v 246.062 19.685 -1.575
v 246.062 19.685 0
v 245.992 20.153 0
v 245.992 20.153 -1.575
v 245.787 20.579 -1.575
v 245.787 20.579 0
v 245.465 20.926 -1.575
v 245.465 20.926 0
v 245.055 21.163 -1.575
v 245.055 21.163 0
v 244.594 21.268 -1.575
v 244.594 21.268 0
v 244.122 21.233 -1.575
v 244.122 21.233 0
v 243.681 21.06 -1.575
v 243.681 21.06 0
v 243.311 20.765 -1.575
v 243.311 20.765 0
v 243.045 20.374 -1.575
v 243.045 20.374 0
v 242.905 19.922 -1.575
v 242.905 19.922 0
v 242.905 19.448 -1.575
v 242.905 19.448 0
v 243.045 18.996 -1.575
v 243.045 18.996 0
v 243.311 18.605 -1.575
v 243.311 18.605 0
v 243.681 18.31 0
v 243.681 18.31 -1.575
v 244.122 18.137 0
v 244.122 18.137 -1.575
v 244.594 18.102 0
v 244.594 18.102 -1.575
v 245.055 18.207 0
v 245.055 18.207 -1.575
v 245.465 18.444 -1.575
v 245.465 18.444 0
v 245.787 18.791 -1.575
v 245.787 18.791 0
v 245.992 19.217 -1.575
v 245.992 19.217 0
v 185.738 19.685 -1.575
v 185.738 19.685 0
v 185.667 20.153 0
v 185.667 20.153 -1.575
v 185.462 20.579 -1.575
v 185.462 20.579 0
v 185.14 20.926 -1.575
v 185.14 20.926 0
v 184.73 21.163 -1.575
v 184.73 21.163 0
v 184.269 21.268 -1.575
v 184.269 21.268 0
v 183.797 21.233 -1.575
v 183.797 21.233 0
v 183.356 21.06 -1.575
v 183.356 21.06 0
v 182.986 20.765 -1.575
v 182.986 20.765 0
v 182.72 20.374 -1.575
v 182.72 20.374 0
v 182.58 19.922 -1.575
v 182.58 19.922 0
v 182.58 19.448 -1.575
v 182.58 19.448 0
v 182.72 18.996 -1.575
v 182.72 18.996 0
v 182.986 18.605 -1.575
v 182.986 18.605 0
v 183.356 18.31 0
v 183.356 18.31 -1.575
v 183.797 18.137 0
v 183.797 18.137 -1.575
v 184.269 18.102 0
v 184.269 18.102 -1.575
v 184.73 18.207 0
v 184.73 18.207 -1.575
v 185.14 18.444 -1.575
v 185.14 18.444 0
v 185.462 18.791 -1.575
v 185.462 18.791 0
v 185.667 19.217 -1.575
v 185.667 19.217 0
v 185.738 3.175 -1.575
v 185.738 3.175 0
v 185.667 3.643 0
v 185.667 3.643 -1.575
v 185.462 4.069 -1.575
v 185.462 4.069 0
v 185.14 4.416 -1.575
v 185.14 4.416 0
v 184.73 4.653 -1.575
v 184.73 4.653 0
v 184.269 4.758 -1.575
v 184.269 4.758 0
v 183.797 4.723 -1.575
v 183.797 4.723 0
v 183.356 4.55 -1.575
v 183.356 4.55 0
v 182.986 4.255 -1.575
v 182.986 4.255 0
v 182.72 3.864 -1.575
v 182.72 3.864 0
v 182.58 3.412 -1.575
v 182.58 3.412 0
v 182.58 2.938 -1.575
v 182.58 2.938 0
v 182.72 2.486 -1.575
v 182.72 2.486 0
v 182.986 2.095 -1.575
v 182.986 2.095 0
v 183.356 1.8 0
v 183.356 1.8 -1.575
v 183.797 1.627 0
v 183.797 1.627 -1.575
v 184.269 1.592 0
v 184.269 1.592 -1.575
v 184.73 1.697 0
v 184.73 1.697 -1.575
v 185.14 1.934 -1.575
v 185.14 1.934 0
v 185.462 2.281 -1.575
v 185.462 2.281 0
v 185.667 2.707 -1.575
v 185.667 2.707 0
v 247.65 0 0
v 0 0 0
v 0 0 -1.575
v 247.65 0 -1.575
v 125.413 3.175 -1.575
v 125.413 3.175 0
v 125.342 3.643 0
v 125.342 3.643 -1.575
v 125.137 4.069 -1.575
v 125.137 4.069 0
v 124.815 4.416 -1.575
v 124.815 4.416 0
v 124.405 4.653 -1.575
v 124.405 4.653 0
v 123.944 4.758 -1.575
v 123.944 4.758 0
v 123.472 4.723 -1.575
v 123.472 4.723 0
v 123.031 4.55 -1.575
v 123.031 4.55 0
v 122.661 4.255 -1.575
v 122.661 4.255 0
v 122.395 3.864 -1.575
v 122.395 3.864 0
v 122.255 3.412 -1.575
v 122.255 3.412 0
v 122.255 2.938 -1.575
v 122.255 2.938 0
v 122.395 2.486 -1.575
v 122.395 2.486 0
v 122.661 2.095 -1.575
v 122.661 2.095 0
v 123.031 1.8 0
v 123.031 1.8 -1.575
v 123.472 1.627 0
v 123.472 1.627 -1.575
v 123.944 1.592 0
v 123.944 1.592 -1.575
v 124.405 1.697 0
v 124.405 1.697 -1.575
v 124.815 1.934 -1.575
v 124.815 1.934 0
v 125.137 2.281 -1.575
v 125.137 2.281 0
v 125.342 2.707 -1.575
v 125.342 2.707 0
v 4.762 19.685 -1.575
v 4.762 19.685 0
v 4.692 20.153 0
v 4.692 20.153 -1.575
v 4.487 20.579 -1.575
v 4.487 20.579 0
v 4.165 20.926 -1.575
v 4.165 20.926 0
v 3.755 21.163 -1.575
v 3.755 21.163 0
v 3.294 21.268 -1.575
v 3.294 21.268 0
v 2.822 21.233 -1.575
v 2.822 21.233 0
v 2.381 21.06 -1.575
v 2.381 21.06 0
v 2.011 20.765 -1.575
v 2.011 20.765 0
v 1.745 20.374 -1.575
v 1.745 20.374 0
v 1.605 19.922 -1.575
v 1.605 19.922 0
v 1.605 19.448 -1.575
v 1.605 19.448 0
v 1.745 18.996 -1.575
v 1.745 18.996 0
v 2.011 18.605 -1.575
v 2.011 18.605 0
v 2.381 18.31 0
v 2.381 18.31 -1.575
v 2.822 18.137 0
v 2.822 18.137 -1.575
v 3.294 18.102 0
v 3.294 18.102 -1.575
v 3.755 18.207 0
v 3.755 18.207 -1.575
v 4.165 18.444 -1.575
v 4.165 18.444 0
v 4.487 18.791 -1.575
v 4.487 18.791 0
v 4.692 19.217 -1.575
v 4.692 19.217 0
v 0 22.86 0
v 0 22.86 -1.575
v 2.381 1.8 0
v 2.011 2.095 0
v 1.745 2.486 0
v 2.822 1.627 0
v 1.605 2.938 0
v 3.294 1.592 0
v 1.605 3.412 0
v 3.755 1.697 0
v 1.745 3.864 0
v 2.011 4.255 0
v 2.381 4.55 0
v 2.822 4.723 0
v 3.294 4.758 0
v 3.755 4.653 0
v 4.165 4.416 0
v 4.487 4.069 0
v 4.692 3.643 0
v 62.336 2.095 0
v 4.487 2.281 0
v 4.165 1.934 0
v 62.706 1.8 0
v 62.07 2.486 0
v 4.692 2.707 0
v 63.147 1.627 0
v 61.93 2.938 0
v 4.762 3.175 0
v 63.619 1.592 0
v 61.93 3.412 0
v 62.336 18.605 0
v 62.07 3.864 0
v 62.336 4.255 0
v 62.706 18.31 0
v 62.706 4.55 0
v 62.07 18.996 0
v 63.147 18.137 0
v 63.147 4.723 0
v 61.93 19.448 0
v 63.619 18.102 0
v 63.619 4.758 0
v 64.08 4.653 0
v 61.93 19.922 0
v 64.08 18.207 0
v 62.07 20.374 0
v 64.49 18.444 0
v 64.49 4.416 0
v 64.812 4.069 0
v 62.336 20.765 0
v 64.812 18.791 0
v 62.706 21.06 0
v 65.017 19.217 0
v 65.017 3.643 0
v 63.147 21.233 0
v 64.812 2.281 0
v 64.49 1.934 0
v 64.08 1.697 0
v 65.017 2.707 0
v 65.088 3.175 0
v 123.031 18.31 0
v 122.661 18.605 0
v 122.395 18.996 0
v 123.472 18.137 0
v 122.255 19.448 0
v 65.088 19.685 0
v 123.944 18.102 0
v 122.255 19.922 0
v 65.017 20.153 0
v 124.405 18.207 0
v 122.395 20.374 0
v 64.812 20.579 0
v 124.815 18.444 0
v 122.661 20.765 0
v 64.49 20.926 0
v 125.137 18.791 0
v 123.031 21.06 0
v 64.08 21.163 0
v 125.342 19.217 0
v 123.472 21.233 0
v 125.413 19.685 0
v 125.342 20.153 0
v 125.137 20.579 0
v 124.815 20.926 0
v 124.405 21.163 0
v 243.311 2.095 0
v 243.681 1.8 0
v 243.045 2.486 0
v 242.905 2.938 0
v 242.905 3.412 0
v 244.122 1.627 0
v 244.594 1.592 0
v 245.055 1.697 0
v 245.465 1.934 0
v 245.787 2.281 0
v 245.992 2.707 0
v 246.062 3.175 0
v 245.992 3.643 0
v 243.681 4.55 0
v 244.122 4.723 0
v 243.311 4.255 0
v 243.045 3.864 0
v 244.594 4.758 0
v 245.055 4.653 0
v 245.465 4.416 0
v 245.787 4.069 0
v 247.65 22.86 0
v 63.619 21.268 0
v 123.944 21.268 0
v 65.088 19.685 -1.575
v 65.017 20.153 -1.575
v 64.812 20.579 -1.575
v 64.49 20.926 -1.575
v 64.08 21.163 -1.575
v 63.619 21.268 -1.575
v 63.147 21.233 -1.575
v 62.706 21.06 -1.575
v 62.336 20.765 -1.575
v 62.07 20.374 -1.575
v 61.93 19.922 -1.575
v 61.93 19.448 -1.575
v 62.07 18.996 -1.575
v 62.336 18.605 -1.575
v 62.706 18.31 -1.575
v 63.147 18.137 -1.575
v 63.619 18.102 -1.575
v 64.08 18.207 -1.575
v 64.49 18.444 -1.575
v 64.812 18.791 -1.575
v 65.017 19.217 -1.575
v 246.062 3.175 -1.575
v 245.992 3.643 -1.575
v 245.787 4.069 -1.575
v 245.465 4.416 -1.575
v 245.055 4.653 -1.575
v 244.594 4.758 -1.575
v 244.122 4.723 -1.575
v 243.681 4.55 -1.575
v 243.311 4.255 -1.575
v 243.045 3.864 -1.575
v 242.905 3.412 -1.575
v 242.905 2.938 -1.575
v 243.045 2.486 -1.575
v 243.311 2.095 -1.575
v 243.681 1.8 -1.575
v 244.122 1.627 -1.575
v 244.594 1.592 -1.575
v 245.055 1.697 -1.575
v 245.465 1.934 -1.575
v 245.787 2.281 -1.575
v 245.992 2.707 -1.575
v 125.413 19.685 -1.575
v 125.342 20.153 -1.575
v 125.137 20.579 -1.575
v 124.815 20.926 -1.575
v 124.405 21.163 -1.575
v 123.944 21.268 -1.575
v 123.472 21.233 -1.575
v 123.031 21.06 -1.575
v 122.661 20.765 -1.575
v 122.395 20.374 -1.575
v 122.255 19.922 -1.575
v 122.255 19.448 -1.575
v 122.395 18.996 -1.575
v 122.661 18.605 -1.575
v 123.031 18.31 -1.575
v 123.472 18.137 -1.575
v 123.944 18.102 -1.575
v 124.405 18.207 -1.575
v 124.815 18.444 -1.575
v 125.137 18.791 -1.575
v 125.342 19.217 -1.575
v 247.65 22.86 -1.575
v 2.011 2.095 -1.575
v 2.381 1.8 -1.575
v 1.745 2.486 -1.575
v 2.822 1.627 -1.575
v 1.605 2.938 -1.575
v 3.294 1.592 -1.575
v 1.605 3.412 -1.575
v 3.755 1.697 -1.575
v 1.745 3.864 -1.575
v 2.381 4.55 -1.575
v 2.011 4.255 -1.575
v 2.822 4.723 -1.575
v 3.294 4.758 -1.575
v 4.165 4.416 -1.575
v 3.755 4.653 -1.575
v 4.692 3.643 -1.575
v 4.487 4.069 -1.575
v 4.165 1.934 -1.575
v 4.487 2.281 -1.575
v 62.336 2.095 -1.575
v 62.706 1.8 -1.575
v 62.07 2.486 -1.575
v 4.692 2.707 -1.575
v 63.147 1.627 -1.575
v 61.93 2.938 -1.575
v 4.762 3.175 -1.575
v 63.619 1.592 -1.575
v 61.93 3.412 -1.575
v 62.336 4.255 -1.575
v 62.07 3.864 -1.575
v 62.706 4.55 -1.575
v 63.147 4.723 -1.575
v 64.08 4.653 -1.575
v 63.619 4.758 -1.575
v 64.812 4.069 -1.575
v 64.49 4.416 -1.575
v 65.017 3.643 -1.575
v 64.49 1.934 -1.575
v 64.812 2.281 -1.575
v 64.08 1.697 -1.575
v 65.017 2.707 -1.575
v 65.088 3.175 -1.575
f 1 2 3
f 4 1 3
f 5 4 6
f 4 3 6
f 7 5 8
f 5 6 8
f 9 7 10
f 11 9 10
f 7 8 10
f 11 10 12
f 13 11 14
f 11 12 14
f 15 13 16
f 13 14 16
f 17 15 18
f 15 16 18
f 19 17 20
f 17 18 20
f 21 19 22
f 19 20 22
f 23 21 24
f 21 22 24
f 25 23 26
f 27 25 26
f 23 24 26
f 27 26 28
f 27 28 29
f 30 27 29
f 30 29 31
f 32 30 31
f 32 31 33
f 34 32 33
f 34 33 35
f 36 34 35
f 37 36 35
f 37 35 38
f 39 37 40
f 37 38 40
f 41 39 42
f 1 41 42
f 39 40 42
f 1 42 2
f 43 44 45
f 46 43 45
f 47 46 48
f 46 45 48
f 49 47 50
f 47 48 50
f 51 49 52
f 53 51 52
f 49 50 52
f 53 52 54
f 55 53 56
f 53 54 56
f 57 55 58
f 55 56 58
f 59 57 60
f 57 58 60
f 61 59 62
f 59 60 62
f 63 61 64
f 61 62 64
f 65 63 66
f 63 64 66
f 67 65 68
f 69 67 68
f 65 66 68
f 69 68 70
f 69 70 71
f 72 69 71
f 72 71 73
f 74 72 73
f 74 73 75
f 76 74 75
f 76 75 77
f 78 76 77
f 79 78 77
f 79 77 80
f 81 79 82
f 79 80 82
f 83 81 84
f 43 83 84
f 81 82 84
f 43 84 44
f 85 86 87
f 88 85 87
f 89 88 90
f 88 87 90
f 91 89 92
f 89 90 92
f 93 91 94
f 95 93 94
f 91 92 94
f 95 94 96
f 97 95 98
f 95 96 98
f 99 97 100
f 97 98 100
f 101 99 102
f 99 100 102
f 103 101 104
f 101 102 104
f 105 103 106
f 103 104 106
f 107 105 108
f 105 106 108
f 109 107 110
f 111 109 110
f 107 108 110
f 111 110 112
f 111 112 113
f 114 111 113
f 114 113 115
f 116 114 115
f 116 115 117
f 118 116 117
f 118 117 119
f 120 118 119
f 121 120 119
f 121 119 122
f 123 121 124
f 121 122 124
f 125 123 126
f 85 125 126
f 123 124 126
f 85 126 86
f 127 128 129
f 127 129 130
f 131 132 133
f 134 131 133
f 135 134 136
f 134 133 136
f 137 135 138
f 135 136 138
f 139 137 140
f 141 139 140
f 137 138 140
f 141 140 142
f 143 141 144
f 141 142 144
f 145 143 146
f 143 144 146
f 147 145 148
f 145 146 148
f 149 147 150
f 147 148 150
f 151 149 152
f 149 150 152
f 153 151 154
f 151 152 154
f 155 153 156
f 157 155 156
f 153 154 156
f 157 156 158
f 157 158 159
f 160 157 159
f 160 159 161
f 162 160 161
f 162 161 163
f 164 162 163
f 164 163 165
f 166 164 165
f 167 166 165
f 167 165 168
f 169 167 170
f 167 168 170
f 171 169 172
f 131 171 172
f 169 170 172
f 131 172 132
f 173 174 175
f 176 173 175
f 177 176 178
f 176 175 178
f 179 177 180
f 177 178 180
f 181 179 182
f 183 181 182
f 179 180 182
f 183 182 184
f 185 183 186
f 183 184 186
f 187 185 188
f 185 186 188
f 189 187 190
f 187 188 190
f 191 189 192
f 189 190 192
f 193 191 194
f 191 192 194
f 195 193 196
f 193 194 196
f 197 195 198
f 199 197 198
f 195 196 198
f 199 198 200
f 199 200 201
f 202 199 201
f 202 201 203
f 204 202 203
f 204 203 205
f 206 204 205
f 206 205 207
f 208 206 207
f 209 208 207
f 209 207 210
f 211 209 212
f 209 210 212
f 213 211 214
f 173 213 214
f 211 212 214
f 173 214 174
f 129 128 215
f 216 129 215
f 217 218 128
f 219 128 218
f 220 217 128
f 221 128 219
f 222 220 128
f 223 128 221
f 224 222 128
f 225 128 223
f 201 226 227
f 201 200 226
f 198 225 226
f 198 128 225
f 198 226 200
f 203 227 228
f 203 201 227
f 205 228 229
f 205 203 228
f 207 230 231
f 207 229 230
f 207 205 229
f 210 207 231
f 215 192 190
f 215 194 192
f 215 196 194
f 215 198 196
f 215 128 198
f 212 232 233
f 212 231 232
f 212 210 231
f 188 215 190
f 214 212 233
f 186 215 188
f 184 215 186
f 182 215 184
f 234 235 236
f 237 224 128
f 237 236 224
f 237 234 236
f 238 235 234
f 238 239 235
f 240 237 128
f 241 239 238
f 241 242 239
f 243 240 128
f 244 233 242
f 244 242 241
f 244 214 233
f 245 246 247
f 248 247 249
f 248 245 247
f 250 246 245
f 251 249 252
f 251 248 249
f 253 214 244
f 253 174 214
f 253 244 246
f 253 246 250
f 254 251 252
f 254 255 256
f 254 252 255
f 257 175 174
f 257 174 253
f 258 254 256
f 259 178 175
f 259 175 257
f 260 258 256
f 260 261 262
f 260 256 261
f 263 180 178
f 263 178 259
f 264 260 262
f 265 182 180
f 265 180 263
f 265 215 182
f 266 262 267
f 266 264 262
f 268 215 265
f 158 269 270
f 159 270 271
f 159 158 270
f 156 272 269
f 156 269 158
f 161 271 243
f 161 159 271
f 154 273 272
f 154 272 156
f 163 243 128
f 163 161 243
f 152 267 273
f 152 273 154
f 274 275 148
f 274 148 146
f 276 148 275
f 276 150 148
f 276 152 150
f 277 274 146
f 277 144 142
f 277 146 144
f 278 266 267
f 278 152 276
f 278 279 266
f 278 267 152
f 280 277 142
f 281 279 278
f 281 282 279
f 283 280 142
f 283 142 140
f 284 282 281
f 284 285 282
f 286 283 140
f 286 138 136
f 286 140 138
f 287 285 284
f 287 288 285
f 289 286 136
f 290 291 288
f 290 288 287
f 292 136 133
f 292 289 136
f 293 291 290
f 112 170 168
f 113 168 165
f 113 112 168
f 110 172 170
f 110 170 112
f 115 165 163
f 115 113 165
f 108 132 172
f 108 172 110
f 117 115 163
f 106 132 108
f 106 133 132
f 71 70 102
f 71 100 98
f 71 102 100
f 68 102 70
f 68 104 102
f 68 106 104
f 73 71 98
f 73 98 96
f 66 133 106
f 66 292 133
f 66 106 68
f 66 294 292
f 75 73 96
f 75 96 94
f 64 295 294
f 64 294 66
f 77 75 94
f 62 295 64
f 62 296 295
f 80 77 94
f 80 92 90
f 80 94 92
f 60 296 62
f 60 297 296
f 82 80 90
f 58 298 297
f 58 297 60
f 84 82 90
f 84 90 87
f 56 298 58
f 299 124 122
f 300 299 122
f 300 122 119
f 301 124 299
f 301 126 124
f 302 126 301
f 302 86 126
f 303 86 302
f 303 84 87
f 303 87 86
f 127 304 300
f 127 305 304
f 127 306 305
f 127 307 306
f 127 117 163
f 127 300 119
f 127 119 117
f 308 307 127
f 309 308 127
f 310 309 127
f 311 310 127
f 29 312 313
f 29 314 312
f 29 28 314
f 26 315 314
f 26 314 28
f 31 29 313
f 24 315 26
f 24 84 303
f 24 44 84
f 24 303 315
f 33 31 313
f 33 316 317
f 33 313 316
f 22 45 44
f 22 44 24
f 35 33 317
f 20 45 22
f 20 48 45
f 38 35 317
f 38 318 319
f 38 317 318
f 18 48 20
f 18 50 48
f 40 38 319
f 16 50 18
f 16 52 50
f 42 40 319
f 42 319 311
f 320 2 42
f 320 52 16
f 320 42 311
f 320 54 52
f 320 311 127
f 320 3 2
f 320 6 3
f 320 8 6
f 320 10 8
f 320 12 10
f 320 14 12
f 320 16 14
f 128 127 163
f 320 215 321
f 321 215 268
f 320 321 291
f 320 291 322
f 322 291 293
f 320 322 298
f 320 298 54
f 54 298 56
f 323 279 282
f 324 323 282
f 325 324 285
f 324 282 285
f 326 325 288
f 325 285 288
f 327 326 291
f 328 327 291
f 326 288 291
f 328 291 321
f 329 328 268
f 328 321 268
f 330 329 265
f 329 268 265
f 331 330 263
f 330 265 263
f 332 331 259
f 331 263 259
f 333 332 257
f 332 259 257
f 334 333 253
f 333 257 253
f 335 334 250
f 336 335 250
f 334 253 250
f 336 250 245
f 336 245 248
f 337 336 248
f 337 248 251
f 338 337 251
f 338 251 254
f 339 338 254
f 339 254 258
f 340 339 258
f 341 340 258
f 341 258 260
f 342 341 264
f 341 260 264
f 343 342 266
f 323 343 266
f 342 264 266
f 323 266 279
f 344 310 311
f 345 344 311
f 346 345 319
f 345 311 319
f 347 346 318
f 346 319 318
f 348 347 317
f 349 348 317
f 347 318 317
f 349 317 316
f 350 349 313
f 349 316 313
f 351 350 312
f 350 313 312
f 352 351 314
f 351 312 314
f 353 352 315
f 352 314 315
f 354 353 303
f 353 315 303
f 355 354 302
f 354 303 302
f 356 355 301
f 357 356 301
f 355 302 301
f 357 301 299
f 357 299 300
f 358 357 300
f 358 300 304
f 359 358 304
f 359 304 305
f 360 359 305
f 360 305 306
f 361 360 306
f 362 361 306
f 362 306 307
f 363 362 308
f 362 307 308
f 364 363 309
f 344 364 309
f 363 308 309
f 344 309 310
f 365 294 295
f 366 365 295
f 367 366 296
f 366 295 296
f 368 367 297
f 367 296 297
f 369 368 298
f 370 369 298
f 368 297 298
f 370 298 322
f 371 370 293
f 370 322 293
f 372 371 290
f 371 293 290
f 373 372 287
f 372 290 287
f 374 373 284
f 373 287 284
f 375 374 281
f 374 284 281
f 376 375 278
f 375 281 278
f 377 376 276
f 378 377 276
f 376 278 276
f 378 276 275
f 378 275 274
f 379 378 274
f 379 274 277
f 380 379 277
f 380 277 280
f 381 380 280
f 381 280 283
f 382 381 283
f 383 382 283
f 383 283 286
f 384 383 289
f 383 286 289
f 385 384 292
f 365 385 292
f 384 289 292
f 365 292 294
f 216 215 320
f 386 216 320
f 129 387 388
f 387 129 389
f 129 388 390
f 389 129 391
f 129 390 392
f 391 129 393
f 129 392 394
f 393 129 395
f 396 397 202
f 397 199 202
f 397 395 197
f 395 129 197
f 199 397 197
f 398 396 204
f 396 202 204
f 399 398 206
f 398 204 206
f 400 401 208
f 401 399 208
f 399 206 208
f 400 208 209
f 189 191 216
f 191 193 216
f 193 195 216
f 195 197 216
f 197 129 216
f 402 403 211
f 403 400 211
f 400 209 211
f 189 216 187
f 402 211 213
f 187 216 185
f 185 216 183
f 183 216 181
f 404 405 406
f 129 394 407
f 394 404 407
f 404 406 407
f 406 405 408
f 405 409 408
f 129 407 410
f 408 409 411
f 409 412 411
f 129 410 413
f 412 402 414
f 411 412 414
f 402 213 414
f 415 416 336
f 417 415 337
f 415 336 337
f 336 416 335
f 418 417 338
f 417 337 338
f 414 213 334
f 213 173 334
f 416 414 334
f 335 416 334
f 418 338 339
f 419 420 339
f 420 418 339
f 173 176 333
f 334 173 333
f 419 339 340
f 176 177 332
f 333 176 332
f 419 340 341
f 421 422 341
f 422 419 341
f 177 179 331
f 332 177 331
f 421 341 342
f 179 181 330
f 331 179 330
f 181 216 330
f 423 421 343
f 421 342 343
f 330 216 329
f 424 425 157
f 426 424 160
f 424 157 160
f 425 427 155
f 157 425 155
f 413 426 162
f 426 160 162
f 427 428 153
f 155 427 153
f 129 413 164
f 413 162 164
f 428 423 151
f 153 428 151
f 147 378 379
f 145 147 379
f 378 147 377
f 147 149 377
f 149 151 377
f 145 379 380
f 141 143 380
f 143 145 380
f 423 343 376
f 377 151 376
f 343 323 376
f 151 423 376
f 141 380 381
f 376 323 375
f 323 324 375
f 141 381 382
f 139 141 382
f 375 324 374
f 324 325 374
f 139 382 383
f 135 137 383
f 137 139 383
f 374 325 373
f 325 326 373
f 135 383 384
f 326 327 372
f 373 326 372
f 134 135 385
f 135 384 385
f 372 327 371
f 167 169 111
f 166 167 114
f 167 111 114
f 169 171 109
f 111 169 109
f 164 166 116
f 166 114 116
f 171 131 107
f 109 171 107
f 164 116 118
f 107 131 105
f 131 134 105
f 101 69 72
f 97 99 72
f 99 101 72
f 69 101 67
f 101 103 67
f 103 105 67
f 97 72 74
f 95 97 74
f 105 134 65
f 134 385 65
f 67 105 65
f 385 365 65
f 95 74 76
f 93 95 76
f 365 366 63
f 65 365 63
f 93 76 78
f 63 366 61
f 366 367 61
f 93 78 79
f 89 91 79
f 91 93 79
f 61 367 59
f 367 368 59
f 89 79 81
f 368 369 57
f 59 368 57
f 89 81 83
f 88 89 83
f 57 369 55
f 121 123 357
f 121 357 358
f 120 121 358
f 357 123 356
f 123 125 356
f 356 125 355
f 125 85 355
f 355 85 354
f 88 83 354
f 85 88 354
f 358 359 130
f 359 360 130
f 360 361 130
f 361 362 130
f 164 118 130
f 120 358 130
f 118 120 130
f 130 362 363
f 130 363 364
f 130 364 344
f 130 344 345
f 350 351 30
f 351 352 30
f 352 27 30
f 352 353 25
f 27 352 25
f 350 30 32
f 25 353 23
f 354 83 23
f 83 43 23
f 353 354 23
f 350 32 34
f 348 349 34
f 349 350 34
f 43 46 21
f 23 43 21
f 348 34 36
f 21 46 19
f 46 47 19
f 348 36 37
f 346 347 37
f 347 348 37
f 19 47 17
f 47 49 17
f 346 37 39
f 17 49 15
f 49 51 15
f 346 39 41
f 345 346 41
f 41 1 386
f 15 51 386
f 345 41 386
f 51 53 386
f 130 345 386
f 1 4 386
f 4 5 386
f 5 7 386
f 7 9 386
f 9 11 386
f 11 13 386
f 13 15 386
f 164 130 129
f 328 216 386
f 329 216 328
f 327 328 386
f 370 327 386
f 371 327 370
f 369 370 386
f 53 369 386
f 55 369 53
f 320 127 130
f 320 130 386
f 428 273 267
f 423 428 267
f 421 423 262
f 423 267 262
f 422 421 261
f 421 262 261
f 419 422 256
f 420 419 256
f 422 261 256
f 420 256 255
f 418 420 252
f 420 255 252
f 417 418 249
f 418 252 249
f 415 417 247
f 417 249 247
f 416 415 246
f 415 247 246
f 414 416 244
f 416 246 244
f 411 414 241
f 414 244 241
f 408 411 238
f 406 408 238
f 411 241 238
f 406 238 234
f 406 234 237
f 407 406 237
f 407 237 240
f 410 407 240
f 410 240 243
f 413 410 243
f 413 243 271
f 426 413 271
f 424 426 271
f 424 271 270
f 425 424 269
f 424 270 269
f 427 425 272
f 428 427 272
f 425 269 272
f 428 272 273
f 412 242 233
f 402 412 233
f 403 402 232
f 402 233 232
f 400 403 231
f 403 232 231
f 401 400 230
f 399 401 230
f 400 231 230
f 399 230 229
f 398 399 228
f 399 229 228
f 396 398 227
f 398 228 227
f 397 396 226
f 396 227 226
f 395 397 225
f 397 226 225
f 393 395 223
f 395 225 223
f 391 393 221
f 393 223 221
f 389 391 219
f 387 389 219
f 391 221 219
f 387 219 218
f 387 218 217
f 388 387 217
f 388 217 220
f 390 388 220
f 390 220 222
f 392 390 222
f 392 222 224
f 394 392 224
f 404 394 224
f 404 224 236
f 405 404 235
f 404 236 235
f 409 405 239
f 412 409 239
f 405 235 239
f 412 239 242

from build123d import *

# Parameters (mm, degrees)
F0_W     = 247.65
F0_H     = 22.86
F1_DEPTH = 1.5748
F2_R     = 1.5875
F3_DEPTH = 1.5748


with BuildPart() as f1:
    # F0 (on Top) → F1 (new body)
    with BuildSketch(Plane.XY):
        with Locations((123.825, 11.43)):
            Rectangle(F0_W, F0_H)
    extrude(amount=-F1_DEPTH)

    # F2 (on face) → F3 (cut)
    with BuildSketch(Plane.XY):
        with Locations((3.175, 3.175)):
            Circle(F2_R)
        with Locations((3.175, 19.685)):
            Circle(F2_R)
        with Locations((244.475, 19.685)):
            Circle(F2_R)
        with Locations((244.475, 3.175)):
            Circle(F2_R)
        with Locations((123.825, 3.175)):
            Circle(F2_R)
        with Locations((123.825, 19.685)):
            Circle(F2_R)
        with Locations((63.5, 19.685)):
            Circle(F2_R)
        with Locations((63.5, 3.175)):
            Circle(F2_R)
        with Locations((184.15, 19.685)):
            Circle(F2_R)
        with Locations((184.15, 3.175)):
            Circle(F2_R)
    extrude(amount=-F3_DEPTH, mode=Mode.SUBTRACT)


solid = f1.part
